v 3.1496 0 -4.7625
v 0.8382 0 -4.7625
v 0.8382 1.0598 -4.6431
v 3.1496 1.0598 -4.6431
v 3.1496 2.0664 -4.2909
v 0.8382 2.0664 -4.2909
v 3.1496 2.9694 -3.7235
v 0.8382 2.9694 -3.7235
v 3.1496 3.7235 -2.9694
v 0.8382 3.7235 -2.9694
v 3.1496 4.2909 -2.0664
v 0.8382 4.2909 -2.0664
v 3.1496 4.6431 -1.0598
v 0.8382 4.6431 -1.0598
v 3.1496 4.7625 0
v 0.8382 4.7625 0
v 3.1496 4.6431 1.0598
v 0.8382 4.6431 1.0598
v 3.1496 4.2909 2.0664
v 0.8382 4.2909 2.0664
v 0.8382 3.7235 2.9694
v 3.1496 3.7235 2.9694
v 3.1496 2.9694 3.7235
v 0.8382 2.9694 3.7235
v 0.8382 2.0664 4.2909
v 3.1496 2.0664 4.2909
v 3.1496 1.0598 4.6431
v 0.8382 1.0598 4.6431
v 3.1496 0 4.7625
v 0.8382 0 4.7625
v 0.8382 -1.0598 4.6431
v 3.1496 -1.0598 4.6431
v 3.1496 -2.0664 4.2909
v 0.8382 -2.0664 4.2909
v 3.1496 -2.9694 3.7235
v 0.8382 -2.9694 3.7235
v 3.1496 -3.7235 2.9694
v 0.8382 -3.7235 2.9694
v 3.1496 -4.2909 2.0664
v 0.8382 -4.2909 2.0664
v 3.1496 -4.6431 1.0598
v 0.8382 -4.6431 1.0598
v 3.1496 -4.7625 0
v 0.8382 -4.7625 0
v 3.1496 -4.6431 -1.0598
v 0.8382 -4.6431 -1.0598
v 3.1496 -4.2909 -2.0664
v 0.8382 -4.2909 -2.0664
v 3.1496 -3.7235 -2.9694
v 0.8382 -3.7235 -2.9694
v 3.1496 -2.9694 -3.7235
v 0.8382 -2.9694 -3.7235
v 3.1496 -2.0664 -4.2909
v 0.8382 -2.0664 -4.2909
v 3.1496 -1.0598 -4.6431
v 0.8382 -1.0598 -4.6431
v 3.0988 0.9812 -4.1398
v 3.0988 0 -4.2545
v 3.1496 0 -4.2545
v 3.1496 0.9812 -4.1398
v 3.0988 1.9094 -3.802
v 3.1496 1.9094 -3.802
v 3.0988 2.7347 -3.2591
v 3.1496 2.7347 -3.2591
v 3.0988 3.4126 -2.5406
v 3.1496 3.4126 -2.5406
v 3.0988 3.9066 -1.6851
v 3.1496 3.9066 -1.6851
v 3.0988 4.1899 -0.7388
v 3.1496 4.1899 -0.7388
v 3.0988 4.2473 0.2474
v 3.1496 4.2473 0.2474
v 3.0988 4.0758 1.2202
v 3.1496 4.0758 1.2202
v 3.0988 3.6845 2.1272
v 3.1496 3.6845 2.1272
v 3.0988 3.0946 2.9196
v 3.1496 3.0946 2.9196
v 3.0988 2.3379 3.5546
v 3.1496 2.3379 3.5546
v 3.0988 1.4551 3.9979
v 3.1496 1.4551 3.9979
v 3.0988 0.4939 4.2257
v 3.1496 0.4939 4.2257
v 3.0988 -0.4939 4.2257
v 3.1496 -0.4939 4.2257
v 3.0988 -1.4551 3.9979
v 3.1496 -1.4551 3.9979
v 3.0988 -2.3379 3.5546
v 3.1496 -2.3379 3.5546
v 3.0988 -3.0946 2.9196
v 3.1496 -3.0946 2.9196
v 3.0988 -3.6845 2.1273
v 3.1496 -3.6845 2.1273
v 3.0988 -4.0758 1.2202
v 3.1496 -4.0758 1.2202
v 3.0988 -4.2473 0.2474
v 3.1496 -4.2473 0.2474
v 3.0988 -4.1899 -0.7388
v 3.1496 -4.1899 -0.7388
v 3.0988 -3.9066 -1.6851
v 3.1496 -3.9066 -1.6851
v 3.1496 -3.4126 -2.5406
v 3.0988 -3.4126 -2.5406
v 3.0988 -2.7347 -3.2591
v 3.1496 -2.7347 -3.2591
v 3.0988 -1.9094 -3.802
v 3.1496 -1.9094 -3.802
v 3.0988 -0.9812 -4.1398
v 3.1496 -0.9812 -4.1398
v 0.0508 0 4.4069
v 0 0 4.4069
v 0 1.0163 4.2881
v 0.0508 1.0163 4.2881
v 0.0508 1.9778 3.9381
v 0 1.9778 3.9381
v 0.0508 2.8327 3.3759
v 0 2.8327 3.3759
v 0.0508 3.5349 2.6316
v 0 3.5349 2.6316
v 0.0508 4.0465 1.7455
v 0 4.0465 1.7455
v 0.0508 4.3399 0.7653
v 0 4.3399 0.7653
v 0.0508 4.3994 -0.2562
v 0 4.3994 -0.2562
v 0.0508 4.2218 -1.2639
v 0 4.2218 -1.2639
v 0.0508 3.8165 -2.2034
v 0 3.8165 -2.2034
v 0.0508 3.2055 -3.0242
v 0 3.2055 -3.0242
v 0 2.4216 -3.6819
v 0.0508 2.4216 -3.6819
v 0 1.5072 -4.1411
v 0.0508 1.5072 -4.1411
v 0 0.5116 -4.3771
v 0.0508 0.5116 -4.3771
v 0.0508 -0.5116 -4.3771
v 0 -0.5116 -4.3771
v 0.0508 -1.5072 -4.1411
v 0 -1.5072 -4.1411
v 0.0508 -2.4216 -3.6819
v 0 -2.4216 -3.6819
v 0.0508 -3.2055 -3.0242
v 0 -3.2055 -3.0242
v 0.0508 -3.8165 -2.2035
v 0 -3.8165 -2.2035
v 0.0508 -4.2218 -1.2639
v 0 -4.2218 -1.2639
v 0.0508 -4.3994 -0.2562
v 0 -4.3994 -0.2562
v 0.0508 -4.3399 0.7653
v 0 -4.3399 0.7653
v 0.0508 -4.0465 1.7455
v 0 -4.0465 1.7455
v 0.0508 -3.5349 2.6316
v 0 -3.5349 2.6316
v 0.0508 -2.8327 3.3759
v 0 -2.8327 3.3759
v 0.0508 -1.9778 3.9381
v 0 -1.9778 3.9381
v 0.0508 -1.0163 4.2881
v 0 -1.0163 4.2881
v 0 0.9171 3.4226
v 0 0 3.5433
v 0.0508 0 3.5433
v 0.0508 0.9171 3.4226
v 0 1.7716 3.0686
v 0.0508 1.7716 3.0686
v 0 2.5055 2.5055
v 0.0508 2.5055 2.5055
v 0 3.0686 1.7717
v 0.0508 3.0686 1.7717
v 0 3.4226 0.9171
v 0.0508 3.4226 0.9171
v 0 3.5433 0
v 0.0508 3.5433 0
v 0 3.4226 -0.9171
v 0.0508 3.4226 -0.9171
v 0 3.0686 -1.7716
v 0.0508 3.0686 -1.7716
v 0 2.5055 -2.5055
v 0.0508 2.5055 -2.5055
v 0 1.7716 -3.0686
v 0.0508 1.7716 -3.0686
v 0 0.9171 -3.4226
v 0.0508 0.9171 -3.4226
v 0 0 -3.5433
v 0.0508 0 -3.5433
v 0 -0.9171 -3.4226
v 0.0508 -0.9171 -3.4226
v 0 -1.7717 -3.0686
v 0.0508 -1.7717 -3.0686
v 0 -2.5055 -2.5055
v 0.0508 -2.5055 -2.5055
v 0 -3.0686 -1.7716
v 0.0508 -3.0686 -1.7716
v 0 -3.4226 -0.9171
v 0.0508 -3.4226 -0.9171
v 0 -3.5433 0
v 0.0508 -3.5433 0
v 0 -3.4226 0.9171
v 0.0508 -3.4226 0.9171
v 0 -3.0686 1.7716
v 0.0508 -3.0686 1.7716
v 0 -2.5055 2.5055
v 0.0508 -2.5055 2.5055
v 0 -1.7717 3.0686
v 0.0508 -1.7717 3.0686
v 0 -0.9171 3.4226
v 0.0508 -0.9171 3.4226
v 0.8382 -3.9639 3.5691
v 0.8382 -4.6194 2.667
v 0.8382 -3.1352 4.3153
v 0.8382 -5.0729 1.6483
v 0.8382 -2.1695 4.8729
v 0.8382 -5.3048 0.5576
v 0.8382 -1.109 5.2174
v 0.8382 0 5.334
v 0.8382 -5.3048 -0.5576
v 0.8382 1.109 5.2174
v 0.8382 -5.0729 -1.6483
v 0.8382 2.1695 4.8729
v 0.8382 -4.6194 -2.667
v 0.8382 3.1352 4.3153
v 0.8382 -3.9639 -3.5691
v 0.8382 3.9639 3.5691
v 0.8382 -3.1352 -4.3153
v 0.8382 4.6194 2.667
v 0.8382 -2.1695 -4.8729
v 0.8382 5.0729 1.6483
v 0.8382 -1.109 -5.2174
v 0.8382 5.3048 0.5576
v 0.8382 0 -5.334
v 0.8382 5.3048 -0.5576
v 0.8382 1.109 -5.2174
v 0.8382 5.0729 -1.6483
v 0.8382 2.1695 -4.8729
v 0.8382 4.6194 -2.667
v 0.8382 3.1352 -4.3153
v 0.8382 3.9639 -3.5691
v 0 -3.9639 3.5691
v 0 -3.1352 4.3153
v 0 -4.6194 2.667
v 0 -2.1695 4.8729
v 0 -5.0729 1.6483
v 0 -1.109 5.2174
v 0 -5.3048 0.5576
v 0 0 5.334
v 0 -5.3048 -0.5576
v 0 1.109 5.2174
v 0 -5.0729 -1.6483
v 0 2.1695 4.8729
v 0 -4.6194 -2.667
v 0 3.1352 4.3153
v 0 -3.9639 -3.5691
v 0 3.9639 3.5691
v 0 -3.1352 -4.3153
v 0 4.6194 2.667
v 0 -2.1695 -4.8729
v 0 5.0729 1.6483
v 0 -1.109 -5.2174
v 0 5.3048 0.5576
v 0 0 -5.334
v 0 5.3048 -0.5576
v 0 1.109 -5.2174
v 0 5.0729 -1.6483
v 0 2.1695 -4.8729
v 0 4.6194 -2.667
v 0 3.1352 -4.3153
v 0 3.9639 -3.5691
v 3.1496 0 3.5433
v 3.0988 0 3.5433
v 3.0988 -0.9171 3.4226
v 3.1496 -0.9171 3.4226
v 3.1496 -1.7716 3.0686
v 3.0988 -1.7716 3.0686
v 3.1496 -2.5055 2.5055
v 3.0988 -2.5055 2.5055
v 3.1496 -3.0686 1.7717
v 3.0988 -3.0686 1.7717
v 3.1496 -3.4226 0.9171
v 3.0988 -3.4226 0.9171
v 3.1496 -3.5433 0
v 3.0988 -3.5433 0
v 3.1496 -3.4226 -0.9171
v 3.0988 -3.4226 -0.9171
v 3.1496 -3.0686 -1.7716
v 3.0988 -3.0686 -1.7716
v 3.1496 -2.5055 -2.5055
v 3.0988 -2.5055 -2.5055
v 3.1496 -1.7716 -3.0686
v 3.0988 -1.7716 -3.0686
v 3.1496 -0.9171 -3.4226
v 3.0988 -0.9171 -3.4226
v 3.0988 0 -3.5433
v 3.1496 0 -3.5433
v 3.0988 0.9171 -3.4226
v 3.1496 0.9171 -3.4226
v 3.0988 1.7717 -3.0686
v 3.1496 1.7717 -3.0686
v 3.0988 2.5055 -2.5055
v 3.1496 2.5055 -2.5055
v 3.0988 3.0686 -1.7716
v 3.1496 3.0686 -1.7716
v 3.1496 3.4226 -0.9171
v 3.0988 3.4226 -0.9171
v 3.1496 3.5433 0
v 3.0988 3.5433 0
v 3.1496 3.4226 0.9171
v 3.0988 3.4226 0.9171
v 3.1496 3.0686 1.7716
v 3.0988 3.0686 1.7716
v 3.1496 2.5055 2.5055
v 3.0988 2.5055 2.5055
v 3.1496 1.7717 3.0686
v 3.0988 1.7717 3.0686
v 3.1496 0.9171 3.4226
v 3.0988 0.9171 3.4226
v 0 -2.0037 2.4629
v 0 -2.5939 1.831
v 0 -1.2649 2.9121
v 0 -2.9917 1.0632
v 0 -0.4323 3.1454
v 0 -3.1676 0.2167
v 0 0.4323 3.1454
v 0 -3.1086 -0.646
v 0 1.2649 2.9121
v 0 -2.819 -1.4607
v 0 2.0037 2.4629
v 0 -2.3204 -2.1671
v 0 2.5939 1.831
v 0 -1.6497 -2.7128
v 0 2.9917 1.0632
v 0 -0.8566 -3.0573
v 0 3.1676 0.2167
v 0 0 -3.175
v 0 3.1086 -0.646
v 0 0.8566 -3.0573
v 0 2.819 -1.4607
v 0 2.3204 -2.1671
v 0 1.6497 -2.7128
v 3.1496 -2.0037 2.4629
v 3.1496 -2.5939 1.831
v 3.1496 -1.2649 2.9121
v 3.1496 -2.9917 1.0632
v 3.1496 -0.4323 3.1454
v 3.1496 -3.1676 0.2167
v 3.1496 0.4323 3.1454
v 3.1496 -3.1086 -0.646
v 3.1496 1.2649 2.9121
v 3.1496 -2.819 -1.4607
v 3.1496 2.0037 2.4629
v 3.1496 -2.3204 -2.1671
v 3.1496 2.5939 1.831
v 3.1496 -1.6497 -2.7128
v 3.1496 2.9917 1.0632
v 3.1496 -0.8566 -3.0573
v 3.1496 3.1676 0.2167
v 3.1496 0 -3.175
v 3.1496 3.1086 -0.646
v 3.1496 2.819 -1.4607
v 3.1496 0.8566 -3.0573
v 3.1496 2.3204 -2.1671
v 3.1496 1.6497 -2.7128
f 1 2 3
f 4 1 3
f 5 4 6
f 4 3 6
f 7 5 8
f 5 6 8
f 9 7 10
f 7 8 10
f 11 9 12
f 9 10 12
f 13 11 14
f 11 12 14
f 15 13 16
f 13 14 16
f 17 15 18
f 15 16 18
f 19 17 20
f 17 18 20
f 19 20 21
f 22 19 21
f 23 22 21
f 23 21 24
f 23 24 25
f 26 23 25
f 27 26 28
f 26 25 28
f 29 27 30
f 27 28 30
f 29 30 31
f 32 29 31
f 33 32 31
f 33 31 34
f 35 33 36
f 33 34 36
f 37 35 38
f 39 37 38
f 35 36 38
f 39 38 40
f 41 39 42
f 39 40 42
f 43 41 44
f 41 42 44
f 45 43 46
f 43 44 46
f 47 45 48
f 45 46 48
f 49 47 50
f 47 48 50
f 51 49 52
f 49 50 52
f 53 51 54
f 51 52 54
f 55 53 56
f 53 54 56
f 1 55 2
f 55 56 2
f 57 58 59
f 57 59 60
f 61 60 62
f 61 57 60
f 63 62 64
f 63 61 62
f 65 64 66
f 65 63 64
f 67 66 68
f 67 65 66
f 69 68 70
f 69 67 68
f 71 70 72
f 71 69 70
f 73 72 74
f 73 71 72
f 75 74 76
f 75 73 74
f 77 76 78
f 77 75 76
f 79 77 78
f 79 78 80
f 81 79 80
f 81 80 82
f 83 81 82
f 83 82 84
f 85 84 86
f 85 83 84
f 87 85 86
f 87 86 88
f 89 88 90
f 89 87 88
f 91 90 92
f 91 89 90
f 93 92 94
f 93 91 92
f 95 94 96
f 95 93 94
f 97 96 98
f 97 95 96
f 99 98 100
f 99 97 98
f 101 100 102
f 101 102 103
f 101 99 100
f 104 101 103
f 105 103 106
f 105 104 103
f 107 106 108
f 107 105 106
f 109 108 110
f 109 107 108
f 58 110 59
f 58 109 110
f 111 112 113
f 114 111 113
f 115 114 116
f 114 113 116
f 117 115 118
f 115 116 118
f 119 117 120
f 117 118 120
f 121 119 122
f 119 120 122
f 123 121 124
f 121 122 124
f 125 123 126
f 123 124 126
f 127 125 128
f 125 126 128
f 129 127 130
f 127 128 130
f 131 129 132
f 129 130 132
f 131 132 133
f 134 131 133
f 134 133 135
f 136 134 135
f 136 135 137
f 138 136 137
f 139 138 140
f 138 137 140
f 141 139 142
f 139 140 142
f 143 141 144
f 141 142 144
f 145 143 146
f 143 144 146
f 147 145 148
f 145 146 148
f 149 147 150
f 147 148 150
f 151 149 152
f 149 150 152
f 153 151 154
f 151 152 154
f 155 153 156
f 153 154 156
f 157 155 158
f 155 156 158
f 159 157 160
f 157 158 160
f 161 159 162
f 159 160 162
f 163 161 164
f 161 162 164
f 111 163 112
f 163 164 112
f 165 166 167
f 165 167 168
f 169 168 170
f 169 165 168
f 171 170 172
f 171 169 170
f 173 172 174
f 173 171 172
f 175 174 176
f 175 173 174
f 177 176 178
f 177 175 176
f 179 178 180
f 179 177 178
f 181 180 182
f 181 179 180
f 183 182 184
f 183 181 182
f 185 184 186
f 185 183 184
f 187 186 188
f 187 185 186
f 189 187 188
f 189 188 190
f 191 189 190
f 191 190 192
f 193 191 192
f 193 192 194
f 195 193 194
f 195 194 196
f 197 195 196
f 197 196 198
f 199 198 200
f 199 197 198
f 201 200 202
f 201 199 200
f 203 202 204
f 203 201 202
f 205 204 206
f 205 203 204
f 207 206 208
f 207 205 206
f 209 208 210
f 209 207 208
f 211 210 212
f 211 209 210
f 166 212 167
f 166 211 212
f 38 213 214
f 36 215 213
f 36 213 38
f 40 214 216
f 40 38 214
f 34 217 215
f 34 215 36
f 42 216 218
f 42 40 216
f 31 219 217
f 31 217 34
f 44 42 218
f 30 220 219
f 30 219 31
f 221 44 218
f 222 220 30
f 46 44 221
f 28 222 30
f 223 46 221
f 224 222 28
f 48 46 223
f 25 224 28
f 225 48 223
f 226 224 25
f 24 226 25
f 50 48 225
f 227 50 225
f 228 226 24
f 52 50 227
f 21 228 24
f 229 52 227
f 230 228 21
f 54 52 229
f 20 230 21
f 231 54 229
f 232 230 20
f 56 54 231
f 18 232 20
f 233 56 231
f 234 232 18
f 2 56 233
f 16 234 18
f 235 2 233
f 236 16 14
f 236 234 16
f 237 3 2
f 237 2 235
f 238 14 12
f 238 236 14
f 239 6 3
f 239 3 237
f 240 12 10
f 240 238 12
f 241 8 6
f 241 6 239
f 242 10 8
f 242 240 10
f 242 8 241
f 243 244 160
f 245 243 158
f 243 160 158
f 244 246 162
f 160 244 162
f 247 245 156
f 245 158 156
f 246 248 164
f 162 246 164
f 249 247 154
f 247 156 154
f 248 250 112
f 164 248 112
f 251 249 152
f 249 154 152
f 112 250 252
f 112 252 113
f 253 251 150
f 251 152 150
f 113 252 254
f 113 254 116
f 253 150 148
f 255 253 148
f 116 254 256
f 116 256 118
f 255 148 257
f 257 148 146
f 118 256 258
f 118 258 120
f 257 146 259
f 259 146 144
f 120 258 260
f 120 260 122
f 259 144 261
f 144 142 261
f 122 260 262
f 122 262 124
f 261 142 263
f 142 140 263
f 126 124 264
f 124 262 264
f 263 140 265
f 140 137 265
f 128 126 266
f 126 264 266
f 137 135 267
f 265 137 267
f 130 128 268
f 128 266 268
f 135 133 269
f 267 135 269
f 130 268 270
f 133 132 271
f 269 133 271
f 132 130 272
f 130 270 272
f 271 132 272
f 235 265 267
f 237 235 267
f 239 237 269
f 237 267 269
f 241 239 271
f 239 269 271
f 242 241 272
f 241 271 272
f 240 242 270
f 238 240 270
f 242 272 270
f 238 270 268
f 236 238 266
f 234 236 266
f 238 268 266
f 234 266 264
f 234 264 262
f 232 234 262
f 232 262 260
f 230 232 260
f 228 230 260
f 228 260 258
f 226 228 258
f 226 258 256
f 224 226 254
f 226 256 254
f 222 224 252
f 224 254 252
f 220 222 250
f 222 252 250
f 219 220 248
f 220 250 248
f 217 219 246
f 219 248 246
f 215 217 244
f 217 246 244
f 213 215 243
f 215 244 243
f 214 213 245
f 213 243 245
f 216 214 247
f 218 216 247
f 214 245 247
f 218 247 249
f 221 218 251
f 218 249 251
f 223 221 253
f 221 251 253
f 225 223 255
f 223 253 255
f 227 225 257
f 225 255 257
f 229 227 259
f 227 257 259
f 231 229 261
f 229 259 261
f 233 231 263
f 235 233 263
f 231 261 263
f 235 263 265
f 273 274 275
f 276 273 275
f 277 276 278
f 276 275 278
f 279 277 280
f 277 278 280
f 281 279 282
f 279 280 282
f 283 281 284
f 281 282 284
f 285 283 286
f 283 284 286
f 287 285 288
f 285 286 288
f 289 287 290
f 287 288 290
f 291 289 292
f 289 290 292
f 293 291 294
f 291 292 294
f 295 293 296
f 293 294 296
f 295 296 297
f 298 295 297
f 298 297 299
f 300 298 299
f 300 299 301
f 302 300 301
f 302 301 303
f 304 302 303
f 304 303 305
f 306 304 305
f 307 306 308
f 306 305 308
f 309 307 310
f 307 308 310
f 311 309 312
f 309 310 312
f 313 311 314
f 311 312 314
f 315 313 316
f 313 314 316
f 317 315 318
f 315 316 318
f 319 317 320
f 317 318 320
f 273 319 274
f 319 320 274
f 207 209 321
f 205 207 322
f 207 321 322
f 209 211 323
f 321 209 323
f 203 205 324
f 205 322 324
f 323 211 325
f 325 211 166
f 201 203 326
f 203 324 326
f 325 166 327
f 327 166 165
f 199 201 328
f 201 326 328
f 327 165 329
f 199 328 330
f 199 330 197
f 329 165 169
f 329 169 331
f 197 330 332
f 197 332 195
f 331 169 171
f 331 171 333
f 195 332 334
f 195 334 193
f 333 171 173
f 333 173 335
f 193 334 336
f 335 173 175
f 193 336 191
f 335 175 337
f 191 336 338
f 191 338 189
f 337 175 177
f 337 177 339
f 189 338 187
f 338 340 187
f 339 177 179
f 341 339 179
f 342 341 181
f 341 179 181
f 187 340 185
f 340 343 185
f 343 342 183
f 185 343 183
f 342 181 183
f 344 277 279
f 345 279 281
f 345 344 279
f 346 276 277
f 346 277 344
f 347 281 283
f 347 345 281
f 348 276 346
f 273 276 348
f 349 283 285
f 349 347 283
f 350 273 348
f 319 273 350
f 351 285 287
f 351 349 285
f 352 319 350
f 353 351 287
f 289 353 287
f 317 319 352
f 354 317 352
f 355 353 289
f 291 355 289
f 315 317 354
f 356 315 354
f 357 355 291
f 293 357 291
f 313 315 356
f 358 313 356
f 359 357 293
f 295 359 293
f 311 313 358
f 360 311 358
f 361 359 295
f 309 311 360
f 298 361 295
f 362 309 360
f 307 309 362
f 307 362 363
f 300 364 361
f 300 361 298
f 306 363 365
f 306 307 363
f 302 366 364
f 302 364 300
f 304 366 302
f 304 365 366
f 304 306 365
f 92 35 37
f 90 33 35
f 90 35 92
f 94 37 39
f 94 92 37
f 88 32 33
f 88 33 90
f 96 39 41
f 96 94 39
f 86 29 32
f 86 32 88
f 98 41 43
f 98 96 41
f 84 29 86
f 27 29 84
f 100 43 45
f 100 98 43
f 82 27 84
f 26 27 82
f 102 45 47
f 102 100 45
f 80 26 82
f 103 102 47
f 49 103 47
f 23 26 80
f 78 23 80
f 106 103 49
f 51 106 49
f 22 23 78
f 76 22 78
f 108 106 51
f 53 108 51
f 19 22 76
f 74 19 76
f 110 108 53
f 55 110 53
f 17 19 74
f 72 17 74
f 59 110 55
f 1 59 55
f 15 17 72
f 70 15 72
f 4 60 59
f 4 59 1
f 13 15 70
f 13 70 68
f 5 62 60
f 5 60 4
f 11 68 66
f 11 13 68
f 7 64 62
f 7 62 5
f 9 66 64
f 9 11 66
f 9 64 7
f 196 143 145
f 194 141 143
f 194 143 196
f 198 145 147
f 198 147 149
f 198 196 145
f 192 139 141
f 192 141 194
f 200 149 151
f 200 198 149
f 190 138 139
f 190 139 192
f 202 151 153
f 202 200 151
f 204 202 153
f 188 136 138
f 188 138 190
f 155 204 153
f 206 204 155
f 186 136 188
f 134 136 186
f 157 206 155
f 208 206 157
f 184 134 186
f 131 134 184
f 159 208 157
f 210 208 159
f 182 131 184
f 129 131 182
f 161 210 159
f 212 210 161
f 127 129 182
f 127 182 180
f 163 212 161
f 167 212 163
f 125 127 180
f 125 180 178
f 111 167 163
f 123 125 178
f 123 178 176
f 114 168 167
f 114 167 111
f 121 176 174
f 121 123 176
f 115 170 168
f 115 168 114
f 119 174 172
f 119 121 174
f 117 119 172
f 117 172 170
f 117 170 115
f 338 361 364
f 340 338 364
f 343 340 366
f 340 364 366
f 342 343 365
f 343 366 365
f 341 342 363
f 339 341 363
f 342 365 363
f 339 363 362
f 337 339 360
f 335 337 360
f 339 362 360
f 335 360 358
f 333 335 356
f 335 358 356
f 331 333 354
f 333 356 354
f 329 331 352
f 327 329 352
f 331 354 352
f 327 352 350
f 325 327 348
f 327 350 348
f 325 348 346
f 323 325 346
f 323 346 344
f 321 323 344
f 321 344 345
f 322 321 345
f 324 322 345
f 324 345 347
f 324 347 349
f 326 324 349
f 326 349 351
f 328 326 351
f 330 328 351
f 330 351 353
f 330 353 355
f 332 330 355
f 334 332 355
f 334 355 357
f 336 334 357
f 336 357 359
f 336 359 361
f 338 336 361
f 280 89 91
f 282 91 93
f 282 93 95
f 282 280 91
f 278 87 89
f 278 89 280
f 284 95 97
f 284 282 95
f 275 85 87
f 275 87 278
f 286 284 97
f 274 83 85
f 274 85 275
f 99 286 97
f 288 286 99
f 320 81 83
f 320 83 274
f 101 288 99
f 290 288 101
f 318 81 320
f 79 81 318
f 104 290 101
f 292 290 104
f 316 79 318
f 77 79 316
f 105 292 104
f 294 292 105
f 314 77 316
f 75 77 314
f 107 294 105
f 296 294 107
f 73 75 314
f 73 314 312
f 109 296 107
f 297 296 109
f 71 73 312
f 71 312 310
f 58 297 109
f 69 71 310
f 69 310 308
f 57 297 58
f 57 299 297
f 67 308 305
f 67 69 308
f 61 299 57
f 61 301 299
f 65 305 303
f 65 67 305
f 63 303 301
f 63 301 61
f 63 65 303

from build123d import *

# Parameters (mm, degrees)
SKETCH1_R           = 5.334
BOSS_EXTRUDE1_DEPTH = 0.8382
SKETCH2_R           = 4.7625
BOSS_EXTRUDE2_DEPTH = 2.3114
SKETCH3_R           = 3.175
CUT_EXTRUDE1_DEPTH  = 9.174539263
SKETCH4_R           = 4.4069
SKETCH4_R_2         = 3.5433
CUT_EXTRUDE2_DEPTH  = 0.0508
CUT_EXTRUDE3_START  = -0.0508
SKETCH5_R           = 4.2545
SKETCH5_R_2         = 3.5433
CUT_EXTRUDE3_DEPTH  = 0.0508


with BuildPart() as part:
    # Sketch1 → Boss-Extrude1 (new body)
    with BuildSketch(Plane(origin=(0, 0, 0), x_dir=(0, 0, -1), z_dir=(1, 0, 0))):
        Circle(SKETCH1_R)
    extrude(amount=BOSS_EXTRUDE1_DEPTH)

    # Sketch2 → Boss-Extrude2 (add)
    with BuildSketch(Plane(origin=(0.8382, 0, 0), x_dir=(0, 0, -1), z_dir=(1, 0, 0))):
        Circle(SKETCH2_R)
    extrude(amount=BOSS_EXTRUDE2_DEPTH)

    # Sketch3 → Cut-Extrude1 (cut, through all)
    with BuildSketch(Plane(origin=(3.1496, 0, 0), x_dir=(0, 0, -1), z_dir=(1, 0, 0))):
        Circle(SKETCH3_R)
    extrude(amount=-CUT_EXTRUDE1_DEPTH, mode=Mode.SUBTRACT)

    # Sketch4 → Cut-Extrude2 (cut)
    with BuildSketch(Plane.ZY):
        Circle(SKETCH4_R)
        Circle(SKETCH4_R_2, mode=Mode.SUBTRACT)
    extrude(amount=-CUT_EXTRUDE2_DEPTH, mode=Mode.SUBTRACT)

    # Sketch5 → Cut-Extrude3 (cut)
    with BuildSketch(Plane(origin=(3.1496, 0, 0), x_dir=(0, 0, -1), z_dir=(1, 0, 0)).offset(CUT_EXTRUDE3_START)):
        Circle(SKETCH5_R)
        with Locations(Location((0, 0, 0), (0, 0, 180))):
            Circle(SKETCH5_R_2, mode=Mode.SUBTRACT)
    extrude(amount=CUT_EXTRUDE3_DEPTH, mode=Mode.SUBTRACT)


solid = part.part
